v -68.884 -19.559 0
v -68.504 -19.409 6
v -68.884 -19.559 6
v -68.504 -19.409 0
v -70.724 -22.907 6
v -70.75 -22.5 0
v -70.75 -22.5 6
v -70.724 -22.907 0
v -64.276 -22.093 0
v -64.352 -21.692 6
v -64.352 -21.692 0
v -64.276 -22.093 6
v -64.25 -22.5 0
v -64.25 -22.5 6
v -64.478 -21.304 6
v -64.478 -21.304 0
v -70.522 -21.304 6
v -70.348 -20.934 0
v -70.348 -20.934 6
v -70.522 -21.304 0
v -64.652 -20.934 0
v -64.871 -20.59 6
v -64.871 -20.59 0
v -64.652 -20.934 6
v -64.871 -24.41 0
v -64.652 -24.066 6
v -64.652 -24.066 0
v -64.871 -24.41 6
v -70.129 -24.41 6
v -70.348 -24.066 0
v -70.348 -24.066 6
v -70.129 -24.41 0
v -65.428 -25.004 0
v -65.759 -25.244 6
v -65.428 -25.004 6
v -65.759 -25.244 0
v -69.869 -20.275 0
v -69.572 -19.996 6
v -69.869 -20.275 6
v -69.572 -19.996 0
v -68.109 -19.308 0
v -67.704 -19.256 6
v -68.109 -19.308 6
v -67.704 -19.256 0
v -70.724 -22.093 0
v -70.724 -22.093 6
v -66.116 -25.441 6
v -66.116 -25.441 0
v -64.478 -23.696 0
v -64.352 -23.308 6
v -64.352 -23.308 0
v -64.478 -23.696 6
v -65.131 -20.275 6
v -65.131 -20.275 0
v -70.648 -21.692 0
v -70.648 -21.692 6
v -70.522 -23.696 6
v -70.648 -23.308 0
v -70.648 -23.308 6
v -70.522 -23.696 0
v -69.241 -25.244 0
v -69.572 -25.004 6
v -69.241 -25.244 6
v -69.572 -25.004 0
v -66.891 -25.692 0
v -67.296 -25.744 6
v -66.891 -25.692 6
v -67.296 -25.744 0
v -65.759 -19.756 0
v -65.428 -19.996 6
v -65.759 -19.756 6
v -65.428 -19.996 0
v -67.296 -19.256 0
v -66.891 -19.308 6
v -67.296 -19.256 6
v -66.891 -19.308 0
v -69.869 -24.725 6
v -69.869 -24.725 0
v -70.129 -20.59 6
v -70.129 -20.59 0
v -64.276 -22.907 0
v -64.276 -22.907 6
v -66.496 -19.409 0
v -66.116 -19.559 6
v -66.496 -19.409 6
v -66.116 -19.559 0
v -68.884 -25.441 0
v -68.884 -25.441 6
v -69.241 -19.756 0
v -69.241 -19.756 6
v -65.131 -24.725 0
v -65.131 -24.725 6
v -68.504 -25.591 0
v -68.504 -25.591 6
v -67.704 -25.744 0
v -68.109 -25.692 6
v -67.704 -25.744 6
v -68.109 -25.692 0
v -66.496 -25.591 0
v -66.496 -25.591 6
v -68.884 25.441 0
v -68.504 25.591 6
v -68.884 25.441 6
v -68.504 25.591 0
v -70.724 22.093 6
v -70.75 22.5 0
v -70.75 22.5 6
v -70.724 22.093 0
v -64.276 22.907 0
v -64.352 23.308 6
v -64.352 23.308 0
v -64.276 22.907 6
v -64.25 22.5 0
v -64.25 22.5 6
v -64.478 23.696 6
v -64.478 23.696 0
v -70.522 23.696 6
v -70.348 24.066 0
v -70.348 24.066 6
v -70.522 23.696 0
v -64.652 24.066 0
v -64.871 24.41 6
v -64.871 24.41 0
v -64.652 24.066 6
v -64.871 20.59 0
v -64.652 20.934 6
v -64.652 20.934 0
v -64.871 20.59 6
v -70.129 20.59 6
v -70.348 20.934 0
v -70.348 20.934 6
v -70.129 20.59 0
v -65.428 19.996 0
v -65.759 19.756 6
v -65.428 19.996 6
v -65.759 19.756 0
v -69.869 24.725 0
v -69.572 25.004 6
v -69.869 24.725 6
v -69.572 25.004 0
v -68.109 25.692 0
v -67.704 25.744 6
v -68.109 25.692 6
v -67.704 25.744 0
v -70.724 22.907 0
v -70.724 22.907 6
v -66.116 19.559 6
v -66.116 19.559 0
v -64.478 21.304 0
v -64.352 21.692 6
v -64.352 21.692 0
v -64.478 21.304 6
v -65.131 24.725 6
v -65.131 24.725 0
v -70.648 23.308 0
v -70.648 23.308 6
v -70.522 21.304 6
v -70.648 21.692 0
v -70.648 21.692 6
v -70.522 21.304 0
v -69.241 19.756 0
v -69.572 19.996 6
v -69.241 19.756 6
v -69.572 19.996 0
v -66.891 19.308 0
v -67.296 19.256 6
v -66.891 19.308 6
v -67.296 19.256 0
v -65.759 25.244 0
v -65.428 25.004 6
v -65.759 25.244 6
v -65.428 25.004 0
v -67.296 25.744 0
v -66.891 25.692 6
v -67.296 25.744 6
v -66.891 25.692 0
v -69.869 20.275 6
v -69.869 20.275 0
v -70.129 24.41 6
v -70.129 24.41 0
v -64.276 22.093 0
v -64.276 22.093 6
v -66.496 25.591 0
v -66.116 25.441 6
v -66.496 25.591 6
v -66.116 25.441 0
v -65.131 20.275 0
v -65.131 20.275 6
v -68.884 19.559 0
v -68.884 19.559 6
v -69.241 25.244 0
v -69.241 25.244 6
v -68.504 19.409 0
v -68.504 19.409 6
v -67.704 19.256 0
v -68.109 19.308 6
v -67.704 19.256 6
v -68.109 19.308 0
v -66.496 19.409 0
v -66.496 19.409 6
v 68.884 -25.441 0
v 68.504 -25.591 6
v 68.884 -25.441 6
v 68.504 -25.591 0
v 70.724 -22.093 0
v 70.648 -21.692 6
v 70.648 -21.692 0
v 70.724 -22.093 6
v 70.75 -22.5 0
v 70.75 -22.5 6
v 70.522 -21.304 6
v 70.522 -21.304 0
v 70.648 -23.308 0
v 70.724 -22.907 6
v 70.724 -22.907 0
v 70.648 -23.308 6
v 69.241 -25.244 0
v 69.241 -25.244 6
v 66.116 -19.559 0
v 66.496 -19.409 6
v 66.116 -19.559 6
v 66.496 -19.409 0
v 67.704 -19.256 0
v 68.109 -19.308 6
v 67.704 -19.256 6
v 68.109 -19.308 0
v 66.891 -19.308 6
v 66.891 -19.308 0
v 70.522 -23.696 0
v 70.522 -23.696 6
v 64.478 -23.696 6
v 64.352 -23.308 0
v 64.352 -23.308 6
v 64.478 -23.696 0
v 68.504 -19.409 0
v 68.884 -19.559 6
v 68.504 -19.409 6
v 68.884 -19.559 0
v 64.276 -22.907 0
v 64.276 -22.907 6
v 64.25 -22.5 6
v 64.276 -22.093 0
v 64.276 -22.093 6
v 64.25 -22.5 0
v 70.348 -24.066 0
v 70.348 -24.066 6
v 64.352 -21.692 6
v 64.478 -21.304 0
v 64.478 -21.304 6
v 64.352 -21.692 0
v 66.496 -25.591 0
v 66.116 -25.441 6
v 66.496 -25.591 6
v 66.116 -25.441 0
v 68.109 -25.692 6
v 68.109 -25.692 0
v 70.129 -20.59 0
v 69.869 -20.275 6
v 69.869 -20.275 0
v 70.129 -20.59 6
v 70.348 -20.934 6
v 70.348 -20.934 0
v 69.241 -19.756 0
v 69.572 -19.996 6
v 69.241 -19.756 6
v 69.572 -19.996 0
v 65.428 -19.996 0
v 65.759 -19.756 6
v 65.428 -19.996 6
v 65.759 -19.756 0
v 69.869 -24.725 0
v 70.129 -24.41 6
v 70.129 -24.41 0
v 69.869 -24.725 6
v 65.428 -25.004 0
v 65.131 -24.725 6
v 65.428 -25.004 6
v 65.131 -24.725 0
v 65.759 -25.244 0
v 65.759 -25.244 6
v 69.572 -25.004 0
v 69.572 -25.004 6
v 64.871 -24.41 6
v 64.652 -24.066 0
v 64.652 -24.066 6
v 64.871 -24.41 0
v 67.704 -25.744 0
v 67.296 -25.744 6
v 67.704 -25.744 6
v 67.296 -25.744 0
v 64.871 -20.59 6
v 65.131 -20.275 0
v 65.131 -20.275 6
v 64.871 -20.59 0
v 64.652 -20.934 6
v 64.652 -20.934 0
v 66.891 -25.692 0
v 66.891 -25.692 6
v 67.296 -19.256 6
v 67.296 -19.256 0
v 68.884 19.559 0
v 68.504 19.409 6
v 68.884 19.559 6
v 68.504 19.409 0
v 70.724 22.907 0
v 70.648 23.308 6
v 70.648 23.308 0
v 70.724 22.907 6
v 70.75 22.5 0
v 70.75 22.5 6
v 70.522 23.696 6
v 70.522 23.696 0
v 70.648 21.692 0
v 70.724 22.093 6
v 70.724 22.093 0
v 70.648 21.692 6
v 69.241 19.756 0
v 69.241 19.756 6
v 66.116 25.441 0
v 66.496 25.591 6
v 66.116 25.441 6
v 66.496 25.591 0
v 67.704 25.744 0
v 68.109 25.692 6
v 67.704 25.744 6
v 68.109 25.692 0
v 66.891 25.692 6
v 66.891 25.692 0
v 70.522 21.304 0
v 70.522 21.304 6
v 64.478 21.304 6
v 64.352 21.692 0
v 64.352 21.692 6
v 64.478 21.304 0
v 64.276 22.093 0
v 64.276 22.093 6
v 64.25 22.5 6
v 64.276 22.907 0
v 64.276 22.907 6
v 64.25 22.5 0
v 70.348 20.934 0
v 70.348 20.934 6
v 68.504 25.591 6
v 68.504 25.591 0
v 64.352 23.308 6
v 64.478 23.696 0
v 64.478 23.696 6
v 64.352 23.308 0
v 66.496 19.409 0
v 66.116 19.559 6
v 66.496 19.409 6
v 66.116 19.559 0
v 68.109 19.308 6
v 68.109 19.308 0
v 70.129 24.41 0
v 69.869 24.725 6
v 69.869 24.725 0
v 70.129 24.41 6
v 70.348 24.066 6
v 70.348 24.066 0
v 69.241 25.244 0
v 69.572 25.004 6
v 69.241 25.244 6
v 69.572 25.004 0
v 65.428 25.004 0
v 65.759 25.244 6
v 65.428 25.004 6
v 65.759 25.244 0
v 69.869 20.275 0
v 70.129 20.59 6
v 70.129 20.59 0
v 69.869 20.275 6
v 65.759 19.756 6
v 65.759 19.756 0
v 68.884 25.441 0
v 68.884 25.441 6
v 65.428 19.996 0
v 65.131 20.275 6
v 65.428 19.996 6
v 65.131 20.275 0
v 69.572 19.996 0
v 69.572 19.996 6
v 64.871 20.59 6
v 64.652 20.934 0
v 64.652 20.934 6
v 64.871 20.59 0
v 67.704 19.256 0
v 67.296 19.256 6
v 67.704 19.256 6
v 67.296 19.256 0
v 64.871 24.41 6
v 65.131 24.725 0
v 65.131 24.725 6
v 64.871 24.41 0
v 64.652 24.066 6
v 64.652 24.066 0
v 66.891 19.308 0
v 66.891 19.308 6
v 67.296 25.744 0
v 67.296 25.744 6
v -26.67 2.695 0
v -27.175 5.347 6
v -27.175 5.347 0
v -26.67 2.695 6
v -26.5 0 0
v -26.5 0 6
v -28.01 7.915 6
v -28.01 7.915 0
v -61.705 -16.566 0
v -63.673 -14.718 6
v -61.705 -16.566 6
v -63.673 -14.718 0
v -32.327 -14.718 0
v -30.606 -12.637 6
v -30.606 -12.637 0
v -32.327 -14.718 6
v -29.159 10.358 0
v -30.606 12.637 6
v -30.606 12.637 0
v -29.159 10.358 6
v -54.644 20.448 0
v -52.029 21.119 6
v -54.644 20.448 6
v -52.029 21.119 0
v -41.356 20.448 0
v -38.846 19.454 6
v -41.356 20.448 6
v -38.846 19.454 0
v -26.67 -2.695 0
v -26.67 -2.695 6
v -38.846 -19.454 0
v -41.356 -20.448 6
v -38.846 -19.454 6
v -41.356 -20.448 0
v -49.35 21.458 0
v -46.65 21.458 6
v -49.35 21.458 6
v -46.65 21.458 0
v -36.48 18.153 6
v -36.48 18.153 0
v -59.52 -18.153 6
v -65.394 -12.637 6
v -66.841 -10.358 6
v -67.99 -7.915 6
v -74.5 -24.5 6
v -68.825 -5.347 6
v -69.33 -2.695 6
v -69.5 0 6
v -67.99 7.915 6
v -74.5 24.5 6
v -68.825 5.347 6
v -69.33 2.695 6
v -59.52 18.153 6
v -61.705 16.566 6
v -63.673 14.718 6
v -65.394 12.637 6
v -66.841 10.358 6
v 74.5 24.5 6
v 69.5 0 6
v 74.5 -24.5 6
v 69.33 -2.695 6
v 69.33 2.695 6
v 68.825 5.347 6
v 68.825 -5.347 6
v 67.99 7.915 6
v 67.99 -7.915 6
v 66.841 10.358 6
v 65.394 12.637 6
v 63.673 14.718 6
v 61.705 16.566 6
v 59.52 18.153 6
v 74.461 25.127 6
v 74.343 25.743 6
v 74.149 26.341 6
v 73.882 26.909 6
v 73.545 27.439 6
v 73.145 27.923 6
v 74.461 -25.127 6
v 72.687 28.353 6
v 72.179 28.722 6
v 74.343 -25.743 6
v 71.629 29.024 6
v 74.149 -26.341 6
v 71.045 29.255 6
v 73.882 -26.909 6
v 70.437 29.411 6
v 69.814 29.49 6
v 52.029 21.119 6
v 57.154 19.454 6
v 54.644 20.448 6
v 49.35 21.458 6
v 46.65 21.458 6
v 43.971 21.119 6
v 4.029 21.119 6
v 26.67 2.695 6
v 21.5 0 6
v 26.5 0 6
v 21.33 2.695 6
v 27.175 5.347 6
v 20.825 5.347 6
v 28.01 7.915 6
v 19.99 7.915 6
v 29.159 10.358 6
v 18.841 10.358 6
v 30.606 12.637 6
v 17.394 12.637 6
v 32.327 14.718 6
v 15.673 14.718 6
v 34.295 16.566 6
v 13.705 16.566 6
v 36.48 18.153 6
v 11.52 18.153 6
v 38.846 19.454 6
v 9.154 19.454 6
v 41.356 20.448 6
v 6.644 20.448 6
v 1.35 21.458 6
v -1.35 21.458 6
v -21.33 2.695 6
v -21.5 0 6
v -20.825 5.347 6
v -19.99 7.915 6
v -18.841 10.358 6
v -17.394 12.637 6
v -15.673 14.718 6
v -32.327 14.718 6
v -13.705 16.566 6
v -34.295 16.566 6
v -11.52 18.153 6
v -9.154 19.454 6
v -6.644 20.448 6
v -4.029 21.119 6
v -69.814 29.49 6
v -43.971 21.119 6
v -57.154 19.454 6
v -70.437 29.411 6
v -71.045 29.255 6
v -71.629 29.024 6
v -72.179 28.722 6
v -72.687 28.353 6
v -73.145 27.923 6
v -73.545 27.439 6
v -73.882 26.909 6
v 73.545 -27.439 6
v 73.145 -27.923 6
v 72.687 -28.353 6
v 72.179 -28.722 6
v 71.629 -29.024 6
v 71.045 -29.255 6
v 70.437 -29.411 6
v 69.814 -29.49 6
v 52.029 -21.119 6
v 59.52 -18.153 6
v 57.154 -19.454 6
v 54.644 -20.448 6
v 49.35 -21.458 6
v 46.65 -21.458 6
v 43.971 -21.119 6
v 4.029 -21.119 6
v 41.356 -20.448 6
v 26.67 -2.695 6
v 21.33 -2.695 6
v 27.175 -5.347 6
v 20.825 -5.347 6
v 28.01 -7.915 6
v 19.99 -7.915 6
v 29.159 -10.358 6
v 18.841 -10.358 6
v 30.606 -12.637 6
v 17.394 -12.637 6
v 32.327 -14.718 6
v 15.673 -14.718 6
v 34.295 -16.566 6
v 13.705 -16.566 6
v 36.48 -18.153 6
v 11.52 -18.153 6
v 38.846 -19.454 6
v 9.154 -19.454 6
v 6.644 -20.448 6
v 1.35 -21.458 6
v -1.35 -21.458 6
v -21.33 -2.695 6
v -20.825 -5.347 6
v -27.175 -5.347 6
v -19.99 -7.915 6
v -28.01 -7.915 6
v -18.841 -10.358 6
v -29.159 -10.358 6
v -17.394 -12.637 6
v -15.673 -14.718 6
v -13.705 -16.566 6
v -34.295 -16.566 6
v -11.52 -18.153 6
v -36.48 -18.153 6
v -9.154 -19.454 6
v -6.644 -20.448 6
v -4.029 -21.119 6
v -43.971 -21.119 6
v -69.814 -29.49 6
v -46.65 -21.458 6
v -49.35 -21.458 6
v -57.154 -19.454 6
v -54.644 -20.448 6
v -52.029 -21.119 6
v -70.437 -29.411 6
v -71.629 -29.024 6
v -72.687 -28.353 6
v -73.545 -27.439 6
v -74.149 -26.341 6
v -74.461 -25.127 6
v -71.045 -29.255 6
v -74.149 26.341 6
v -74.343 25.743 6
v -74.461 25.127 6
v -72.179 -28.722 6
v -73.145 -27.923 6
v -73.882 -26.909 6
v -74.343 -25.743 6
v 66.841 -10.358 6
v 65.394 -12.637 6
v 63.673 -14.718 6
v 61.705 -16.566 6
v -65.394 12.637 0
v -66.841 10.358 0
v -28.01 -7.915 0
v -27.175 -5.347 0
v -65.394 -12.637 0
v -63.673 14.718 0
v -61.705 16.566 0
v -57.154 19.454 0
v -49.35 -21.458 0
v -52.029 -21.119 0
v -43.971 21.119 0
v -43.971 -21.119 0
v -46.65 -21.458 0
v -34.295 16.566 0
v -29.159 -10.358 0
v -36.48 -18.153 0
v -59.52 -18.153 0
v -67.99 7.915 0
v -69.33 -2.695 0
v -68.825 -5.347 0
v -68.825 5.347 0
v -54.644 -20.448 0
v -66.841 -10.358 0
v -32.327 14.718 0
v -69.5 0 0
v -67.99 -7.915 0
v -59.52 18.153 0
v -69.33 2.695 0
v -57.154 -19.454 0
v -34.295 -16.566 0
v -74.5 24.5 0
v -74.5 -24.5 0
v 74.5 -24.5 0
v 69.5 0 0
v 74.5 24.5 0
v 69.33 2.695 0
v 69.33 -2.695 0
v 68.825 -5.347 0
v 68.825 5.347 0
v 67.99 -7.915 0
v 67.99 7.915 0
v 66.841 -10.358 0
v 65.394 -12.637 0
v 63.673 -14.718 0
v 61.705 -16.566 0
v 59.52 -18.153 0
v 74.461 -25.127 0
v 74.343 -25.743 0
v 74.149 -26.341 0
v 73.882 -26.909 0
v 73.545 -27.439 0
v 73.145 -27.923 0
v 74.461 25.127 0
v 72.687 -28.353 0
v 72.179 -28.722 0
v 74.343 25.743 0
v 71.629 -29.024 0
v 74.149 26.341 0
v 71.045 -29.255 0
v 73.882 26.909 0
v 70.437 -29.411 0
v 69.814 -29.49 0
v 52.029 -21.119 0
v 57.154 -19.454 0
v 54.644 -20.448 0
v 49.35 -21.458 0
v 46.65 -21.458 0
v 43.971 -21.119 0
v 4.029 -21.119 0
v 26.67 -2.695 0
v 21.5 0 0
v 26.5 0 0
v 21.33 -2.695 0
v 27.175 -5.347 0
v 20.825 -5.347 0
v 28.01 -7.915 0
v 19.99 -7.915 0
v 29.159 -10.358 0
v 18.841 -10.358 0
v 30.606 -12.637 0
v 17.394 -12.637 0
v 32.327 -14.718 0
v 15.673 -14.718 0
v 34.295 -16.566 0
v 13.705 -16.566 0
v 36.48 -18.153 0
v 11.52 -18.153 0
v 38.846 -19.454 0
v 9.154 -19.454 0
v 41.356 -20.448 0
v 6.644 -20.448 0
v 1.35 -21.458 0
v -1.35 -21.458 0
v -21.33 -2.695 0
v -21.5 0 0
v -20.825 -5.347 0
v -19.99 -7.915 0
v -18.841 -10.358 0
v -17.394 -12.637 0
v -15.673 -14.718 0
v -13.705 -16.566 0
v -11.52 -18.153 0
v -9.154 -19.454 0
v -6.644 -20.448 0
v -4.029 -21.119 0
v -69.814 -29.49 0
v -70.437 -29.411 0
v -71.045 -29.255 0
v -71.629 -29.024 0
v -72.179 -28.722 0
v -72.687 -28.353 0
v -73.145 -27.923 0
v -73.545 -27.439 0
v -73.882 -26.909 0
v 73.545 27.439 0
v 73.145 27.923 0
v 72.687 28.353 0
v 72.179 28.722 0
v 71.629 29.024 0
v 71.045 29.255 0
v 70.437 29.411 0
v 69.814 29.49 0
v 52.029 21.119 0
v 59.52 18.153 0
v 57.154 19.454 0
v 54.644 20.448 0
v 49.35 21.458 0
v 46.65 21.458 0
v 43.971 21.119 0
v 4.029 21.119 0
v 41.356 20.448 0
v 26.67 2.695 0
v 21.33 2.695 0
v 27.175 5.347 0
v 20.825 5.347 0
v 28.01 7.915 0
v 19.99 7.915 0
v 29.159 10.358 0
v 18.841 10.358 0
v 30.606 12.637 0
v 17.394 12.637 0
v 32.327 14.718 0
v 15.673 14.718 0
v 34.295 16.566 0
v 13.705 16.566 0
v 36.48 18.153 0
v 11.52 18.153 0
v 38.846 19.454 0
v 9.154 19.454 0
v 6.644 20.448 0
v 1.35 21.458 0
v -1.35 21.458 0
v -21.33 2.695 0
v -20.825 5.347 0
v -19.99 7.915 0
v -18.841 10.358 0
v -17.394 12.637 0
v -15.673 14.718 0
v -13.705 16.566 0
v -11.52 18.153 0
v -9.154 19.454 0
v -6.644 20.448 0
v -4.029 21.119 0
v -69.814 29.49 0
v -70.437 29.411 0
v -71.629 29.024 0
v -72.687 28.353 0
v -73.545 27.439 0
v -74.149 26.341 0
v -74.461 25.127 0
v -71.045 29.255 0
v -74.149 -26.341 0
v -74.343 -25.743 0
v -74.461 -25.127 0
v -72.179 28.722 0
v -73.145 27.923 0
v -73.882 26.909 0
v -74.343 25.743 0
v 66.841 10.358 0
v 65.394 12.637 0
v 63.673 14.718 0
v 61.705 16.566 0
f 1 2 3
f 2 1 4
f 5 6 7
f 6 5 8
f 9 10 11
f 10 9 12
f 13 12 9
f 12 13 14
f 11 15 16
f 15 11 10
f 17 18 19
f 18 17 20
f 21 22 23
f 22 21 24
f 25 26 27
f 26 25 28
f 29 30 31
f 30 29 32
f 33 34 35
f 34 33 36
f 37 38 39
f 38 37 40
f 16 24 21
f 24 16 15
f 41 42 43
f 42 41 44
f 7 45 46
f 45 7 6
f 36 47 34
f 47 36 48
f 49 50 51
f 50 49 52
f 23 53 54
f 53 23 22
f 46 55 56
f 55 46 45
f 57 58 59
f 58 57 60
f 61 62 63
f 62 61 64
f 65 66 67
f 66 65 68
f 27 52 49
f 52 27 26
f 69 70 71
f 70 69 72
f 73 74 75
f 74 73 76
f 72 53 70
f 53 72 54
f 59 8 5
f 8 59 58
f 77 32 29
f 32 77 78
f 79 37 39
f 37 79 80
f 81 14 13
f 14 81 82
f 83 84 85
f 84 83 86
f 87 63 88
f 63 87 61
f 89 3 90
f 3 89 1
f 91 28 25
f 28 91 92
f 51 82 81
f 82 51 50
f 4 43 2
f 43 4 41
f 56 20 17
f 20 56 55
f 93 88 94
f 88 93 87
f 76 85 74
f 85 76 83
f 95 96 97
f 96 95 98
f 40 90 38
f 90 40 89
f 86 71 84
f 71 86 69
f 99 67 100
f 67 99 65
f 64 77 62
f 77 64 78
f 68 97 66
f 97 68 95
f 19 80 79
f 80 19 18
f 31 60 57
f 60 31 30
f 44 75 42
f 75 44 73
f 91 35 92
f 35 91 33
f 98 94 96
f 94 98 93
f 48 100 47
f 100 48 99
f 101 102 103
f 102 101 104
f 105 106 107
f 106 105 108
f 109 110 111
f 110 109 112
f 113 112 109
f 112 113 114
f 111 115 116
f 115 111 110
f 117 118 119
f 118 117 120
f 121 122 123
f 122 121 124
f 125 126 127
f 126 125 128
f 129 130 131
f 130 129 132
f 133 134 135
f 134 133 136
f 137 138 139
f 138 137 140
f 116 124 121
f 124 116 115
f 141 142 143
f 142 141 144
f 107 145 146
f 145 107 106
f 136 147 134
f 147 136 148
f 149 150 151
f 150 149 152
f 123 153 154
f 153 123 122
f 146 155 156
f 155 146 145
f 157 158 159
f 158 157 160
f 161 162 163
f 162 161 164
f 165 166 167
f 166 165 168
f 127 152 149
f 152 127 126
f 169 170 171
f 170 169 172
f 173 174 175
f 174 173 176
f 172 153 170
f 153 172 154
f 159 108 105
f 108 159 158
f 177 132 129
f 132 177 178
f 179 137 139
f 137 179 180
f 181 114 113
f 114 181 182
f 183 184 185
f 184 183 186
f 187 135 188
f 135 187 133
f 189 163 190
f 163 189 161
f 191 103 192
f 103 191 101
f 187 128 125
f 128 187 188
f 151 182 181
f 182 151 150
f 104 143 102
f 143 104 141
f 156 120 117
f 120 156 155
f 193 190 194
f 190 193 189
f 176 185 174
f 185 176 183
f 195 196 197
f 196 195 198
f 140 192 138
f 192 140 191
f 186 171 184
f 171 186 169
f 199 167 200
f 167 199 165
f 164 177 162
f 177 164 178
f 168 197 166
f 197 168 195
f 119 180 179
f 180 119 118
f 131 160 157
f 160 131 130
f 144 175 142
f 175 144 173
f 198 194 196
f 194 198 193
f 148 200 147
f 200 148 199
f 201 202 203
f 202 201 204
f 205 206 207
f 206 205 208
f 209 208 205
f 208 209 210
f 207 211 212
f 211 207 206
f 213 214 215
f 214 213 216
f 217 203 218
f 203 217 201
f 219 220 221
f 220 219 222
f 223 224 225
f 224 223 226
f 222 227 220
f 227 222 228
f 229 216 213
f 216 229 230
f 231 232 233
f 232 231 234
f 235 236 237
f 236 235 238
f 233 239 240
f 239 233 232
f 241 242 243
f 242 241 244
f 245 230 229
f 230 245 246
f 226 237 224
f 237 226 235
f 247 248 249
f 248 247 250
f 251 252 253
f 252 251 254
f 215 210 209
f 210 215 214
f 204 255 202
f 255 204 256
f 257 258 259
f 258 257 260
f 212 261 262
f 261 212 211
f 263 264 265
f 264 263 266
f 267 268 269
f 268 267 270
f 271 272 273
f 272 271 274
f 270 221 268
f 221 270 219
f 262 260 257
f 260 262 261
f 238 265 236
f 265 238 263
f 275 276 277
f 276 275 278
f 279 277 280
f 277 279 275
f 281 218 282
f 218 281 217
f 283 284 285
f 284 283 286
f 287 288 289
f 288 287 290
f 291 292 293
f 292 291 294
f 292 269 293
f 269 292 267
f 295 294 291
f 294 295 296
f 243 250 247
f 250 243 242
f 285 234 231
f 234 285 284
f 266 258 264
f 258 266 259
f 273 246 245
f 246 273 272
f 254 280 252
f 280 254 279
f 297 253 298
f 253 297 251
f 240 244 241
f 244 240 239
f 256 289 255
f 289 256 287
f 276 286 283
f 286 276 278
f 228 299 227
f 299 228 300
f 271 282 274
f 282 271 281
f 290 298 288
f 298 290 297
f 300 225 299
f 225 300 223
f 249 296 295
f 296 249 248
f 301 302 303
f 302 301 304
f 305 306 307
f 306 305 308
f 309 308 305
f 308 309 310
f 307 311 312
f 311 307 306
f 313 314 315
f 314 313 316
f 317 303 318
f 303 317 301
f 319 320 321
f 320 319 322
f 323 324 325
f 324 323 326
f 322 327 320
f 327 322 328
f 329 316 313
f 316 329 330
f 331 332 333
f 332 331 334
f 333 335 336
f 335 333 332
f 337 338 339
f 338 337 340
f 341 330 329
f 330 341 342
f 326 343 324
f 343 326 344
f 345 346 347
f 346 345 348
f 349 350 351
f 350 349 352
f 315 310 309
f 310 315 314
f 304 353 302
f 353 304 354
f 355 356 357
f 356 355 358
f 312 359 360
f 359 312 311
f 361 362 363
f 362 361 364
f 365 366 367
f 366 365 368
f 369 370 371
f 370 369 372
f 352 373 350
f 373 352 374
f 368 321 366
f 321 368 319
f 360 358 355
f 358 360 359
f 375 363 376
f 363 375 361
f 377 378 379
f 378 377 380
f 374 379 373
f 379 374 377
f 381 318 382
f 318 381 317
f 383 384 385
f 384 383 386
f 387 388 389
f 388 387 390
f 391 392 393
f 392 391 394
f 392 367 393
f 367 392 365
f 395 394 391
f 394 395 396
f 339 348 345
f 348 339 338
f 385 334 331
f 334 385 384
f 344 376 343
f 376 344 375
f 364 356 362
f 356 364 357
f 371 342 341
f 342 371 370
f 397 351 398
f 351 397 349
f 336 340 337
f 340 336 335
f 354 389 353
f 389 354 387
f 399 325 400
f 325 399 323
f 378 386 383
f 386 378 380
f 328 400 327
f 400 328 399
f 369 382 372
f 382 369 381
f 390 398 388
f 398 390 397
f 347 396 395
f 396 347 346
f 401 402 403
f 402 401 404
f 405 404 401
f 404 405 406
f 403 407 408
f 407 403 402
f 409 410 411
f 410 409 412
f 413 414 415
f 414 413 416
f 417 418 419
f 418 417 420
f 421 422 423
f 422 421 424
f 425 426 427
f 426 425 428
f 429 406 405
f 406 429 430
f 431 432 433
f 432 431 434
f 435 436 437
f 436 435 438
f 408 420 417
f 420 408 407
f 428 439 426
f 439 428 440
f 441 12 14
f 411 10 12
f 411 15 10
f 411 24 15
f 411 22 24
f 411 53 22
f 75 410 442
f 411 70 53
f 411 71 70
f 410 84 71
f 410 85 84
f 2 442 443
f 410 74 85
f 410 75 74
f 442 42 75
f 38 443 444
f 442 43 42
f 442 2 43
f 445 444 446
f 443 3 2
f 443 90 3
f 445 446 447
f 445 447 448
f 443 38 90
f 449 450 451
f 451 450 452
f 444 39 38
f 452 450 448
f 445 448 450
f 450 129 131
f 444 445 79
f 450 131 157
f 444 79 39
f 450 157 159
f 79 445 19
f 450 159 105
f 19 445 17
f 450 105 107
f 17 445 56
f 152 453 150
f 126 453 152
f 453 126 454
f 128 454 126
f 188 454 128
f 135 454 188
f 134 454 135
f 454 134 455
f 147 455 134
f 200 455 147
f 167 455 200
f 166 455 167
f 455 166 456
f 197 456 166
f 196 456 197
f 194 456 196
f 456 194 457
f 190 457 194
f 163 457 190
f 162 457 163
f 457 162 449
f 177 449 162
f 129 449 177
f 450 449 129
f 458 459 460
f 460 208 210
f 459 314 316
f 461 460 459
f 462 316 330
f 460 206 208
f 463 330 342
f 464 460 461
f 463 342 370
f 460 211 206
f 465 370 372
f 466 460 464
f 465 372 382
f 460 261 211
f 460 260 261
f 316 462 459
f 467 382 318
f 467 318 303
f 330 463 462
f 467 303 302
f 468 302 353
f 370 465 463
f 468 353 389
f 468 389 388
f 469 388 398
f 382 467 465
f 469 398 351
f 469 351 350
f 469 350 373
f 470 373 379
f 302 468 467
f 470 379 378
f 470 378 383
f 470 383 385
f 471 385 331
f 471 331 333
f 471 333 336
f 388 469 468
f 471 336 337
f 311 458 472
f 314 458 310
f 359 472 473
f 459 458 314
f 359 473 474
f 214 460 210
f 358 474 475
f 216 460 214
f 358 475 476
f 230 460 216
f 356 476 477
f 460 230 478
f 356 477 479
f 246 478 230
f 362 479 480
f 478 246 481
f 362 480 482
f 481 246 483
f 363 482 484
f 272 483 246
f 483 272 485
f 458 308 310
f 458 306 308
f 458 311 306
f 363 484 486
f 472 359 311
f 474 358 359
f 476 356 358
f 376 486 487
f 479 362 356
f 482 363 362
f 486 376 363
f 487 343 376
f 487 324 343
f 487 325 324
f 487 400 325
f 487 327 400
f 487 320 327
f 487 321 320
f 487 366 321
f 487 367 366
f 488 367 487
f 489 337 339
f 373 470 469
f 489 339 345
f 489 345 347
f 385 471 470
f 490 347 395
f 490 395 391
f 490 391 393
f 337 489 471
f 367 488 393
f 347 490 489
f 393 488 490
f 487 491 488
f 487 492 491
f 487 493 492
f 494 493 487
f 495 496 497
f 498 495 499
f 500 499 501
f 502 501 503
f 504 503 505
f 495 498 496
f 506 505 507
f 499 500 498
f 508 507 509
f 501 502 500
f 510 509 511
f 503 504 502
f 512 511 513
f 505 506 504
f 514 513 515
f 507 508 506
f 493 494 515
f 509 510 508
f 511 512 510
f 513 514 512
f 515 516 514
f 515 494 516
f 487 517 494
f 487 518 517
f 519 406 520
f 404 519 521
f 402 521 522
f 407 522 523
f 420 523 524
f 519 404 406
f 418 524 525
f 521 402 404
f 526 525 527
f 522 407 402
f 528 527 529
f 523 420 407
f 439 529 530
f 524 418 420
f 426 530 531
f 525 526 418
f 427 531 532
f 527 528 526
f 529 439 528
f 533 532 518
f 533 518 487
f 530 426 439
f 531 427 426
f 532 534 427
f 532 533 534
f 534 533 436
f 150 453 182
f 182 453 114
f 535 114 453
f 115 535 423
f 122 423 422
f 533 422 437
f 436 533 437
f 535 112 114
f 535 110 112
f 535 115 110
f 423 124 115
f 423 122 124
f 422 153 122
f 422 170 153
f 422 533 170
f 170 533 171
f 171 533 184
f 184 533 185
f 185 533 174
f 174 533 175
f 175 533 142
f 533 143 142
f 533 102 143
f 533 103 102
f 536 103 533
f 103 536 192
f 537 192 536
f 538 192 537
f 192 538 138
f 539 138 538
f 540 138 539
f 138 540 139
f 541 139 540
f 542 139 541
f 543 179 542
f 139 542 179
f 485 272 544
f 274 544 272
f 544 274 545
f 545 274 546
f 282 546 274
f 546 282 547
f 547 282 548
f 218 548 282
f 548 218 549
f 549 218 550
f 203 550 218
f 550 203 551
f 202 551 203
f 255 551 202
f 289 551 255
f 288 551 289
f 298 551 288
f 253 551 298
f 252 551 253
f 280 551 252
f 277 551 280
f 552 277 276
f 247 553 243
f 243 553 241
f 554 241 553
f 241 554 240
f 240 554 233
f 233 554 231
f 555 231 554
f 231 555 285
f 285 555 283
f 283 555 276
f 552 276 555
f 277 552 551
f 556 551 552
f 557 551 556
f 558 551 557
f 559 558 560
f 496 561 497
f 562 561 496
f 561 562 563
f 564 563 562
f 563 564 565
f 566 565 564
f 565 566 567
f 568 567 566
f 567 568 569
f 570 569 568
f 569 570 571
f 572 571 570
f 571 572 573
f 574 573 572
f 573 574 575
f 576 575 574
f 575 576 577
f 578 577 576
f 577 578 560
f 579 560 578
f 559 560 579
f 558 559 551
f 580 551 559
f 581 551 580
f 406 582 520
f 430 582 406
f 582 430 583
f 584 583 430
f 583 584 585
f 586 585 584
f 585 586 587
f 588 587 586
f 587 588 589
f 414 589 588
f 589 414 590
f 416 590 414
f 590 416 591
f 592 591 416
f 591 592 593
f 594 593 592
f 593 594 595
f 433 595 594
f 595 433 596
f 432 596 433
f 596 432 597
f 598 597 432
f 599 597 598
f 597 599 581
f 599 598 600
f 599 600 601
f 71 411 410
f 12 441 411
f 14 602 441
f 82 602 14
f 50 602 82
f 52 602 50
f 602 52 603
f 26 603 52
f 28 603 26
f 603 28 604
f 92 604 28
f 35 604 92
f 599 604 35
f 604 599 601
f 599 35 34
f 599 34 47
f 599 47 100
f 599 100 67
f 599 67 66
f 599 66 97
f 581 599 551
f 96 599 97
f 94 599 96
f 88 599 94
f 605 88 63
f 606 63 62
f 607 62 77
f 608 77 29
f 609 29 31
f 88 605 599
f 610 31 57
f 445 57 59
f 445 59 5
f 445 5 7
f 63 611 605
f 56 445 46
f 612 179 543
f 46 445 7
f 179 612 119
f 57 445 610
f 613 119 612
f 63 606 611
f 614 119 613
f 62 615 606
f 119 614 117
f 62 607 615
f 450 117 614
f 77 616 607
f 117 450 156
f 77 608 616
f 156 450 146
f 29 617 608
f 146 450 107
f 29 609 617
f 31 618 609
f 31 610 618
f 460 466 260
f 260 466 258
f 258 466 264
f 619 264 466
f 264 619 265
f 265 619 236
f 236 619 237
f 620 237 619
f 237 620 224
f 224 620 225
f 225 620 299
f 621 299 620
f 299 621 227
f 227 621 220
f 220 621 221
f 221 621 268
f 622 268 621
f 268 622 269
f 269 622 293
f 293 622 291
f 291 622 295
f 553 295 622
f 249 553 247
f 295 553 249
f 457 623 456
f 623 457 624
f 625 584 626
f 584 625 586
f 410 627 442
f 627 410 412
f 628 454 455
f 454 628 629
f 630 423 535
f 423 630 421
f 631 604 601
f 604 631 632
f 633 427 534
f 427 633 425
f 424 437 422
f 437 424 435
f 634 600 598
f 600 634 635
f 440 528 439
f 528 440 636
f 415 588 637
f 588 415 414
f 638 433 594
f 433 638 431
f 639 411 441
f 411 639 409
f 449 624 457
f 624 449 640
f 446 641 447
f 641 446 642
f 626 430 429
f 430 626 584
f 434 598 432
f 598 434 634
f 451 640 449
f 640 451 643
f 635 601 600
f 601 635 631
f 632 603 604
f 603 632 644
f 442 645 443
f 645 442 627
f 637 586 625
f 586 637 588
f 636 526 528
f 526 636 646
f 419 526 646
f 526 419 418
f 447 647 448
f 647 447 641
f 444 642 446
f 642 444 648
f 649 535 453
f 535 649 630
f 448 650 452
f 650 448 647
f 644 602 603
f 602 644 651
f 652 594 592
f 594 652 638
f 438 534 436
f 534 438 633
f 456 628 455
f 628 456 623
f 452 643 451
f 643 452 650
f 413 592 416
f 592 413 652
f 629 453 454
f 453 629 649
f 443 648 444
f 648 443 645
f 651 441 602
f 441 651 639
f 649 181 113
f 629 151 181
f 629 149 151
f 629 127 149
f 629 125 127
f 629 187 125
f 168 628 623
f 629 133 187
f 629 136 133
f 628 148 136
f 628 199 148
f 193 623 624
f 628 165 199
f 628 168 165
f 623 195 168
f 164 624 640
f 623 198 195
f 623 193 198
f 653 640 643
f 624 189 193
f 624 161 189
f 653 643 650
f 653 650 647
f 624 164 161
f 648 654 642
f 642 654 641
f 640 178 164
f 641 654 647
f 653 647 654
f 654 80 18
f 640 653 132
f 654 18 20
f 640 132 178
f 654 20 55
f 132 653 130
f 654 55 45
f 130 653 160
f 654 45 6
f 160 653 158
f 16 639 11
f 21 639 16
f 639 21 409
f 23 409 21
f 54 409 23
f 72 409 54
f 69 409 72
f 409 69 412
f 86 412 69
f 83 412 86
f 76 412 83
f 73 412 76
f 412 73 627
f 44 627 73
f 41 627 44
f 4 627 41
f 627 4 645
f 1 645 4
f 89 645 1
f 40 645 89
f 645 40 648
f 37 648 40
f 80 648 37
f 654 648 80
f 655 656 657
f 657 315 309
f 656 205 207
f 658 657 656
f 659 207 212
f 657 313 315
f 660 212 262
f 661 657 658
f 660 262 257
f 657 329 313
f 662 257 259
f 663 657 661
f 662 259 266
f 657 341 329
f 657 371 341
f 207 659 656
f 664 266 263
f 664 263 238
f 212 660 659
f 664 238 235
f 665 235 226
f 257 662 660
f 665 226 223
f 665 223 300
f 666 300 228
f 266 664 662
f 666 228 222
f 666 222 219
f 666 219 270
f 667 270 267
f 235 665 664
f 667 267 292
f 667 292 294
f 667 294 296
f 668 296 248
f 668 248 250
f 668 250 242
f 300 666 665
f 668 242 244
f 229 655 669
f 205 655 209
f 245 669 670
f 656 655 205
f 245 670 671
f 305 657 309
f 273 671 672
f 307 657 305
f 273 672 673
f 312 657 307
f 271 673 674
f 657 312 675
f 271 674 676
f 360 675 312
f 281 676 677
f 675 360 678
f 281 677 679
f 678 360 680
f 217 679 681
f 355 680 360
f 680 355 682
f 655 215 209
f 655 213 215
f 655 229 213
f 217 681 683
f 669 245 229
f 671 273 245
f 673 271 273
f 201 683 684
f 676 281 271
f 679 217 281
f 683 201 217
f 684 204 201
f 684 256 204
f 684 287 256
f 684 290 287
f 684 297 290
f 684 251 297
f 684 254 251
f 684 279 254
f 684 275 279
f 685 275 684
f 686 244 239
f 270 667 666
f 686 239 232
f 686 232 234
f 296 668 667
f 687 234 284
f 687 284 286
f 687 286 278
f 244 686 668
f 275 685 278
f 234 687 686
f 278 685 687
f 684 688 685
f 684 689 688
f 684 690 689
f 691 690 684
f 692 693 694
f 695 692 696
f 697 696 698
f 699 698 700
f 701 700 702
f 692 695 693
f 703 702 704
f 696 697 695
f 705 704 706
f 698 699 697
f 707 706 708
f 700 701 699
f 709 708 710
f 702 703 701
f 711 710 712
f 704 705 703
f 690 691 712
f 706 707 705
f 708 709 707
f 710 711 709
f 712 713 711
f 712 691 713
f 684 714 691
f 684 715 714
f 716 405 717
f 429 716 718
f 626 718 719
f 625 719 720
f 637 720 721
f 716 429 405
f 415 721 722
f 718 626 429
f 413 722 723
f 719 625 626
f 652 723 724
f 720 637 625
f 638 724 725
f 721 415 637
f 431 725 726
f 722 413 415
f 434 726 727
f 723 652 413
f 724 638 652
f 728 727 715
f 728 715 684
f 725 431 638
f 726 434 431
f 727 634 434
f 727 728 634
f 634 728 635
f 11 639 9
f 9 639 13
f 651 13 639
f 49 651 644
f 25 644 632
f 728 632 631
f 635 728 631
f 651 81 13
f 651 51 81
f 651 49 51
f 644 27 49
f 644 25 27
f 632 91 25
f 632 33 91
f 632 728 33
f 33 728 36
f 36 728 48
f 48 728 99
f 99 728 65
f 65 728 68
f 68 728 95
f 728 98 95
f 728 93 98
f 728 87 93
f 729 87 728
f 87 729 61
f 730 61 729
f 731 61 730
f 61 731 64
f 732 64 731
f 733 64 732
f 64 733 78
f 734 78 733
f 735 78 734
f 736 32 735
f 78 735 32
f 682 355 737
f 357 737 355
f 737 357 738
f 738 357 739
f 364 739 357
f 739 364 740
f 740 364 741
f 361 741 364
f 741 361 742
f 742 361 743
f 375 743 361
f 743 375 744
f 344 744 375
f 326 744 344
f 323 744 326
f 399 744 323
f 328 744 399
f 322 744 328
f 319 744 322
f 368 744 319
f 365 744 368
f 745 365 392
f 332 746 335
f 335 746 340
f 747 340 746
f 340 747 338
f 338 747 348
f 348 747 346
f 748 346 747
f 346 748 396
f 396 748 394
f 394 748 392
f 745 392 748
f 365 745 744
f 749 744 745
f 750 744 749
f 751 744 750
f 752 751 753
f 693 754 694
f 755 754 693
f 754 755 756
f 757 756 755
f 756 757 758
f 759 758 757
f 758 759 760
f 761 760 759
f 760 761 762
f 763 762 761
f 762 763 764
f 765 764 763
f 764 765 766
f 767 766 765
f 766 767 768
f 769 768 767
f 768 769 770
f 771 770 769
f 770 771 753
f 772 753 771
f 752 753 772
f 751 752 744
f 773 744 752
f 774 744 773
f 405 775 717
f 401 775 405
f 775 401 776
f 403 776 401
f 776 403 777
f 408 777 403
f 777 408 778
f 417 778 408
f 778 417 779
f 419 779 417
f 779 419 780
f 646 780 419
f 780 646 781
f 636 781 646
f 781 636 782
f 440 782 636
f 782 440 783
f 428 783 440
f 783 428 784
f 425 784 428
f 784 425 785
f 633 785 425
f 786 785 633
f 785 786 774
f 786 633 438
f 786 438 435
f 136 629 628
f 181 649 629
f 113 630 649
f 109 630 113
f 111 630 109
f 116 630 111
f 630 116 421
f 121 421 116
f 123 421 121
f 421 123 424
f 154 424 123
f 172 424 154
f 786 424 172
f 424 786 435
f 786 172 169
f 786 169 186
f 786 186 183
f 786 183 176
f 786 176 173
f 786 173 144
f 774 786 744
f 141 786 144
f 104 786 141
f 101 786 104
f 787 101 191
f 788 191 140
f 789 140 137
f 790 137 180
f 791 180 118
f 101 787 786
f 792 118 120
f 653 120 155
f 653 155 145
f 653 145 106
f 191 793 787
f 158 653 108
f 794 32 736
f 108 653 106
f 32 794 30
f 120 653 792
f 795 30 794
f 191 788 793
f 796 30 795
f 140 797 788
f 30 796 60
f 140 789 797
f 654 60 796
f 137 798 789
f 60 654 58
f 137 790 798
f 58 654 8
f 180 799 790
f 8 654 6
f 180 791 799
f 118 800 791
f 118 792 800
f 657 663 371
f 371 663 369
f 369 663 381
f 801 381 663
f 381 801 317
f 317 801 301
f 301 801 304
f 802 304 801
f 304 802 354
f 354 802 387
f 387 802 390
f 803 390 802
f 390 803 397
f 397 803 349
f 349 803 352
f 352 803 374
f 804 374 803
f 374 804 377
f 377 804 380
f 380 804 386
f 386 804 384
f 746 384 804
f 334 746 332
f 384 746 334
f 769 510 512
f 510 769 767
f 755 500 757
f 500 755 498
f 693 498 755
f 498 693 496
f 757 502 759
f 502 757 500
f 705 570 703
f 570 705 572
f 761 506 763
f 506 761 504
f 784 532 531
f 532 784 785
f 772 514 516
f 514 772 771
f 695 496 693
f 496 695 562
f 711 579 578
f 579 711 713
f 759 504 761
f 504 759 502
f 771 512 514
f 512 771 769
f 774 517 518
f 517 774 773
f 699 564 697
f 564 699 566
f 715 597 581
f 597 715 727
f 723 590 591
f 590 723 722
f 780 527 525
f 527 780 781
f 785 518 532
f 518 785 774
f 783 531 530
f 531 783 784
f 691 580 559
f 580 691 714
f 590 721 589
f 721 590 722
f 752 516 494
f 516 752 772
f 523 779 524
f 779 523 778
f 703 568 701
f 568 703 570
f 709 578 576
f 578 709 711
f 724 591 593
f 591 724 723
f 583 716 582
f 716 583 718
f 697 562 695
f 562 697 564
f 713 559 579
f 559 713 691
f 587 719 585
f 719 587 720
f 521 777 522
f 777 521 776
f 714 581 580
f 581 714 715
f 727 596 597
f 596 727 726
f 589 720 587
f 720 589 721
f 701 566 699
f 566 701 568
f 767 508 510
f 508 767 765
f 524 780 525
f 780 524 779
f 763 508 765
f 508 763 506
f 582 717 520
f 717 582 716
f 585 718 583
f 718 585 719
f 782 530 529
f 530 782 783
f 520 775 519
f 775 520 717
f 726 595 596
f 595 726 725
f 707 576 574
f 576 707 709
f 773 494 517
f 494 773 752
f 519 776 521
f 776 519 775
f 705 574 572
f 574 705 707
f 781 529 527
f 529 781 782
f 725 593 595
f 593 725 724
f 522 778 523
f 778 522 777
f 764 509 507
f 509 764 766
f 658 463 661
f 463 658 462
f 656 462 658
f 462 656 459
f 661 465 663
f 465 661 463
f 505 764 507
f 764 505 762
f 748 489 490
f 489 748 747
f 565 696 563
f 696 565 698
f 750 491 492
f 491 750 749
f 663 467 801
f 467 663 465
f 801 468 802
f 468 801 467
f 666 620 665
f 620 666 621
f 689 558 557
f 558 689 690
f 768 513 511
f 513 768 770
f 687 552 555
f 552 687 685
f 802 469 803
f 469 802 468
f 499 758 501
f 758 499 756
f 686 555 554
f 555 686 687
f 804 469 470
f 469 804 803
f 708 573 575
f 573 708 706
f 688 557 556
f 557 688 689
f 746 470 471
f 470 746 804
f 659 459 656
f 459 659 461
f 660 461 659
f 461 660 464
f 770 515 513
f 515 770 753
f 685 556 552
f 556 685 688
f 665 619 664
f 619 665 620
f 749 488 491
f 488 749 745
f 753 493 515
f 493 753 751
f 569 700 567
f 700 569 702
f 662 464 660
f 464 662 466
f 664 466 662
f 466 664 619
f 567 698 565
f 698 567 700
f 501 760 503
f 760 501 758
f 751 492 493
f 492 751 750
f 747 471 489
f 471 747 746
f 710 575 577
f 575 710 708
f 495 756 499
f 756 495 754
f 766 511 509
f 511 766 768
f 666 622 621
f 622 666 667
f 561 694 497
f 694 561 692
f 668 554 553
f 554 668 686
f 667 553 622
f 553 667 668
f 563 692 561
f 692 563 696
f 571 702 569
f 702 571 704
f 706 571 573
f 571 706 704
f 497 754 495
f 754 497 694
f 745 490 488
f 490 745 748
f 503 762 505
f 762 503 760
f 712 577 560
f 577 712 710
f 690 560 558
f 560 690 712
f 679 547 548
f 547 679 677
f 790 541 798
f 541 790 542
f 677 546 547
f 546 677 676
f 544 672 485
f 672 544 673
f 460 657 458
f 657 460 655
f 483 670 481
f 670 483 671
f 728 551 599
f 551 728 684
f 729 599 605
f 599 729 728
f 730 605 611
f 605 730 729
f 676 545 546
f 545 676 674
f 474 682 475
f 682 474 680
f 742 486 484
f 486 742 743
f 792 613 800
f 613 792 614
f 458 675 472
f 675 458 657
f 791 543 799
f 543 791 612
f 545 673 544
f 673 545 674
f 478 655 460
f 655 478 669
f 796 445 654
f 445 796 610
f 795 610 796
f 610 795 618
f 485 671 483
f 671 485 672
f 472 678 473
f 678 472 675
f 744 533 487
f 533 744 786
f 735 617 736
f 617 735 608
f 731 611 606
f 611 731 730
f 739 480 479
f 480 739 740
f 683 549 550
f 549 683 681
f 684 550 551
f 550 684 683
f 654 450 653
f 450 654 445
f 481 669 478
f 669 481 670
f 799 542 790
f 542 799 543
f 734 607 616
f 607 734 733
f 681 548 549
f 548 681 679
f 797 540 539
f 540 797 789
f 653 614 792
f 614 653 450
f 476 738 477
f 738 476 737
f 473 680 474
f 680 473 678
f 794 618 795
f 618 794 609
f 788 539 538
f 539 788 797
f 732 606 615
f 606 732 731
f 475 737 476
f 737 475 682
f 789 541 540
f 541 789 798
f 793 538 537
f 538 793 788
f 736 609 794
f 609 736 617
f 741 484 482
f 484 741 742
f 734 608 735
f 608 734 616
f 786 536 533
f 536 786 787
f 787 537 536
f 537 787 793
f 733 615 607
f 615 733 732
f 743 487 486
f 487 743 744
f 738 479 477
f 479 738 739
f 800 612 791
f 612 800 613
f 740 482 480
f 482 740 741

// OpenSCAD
$fn = 50;


difference() {
	union() {
		hull() {
			translate(v = [-69.5000000000, 24.5000000000, 0]) {
				cylinder(h = 6, r = 5);
			}
			translate(v = [69.5000000000, 24.5000000000, 0]) {
				cylinder(h = 6, r = 5);
			}
			translate(v = [-69.5000000000, -24.5000000000, 0]) {
				cylinder(h = 6, r = 5);
			}
			translate(v = [69.5000000000, -24.5000000000, 0]) {
				cylinder(h = 6, r = 5);
			}
		}
	}
	union() {
		#translate(v = [-67.5000000000, -22.5000000000, -100.0000000000]) {
			cylinder(h = 200, r = 3.2500000000);
		}
		#translate(v = [-67.5000000000, 22.5000000000, -100.0000000000]) {
			cylinder(h = 200, r = 3.2500000000);
		}
		#translate(v = [67.5000000000, -22.5000000000, -100.0000000000]) {
			cylinder(h = 200, r = 3.2500000000);
		}
		#translate(v = [67.5000000000, 22.5000000000, -100.0000000000]) {
			cylinder(h = 200, r = 3.2500000000);
		}
		#translate(v = [-48.0000000000, 0, 0]) {
			cylinder(h = 6, r = 21.5000000000);
		}
		#cylinder(h = 6, r = 21.5000000000);
		#translate(v = [48.0000000000, 0, 0]) {
			cylinder(h = 6, r = 21.5000000000);
		}
	}
}
